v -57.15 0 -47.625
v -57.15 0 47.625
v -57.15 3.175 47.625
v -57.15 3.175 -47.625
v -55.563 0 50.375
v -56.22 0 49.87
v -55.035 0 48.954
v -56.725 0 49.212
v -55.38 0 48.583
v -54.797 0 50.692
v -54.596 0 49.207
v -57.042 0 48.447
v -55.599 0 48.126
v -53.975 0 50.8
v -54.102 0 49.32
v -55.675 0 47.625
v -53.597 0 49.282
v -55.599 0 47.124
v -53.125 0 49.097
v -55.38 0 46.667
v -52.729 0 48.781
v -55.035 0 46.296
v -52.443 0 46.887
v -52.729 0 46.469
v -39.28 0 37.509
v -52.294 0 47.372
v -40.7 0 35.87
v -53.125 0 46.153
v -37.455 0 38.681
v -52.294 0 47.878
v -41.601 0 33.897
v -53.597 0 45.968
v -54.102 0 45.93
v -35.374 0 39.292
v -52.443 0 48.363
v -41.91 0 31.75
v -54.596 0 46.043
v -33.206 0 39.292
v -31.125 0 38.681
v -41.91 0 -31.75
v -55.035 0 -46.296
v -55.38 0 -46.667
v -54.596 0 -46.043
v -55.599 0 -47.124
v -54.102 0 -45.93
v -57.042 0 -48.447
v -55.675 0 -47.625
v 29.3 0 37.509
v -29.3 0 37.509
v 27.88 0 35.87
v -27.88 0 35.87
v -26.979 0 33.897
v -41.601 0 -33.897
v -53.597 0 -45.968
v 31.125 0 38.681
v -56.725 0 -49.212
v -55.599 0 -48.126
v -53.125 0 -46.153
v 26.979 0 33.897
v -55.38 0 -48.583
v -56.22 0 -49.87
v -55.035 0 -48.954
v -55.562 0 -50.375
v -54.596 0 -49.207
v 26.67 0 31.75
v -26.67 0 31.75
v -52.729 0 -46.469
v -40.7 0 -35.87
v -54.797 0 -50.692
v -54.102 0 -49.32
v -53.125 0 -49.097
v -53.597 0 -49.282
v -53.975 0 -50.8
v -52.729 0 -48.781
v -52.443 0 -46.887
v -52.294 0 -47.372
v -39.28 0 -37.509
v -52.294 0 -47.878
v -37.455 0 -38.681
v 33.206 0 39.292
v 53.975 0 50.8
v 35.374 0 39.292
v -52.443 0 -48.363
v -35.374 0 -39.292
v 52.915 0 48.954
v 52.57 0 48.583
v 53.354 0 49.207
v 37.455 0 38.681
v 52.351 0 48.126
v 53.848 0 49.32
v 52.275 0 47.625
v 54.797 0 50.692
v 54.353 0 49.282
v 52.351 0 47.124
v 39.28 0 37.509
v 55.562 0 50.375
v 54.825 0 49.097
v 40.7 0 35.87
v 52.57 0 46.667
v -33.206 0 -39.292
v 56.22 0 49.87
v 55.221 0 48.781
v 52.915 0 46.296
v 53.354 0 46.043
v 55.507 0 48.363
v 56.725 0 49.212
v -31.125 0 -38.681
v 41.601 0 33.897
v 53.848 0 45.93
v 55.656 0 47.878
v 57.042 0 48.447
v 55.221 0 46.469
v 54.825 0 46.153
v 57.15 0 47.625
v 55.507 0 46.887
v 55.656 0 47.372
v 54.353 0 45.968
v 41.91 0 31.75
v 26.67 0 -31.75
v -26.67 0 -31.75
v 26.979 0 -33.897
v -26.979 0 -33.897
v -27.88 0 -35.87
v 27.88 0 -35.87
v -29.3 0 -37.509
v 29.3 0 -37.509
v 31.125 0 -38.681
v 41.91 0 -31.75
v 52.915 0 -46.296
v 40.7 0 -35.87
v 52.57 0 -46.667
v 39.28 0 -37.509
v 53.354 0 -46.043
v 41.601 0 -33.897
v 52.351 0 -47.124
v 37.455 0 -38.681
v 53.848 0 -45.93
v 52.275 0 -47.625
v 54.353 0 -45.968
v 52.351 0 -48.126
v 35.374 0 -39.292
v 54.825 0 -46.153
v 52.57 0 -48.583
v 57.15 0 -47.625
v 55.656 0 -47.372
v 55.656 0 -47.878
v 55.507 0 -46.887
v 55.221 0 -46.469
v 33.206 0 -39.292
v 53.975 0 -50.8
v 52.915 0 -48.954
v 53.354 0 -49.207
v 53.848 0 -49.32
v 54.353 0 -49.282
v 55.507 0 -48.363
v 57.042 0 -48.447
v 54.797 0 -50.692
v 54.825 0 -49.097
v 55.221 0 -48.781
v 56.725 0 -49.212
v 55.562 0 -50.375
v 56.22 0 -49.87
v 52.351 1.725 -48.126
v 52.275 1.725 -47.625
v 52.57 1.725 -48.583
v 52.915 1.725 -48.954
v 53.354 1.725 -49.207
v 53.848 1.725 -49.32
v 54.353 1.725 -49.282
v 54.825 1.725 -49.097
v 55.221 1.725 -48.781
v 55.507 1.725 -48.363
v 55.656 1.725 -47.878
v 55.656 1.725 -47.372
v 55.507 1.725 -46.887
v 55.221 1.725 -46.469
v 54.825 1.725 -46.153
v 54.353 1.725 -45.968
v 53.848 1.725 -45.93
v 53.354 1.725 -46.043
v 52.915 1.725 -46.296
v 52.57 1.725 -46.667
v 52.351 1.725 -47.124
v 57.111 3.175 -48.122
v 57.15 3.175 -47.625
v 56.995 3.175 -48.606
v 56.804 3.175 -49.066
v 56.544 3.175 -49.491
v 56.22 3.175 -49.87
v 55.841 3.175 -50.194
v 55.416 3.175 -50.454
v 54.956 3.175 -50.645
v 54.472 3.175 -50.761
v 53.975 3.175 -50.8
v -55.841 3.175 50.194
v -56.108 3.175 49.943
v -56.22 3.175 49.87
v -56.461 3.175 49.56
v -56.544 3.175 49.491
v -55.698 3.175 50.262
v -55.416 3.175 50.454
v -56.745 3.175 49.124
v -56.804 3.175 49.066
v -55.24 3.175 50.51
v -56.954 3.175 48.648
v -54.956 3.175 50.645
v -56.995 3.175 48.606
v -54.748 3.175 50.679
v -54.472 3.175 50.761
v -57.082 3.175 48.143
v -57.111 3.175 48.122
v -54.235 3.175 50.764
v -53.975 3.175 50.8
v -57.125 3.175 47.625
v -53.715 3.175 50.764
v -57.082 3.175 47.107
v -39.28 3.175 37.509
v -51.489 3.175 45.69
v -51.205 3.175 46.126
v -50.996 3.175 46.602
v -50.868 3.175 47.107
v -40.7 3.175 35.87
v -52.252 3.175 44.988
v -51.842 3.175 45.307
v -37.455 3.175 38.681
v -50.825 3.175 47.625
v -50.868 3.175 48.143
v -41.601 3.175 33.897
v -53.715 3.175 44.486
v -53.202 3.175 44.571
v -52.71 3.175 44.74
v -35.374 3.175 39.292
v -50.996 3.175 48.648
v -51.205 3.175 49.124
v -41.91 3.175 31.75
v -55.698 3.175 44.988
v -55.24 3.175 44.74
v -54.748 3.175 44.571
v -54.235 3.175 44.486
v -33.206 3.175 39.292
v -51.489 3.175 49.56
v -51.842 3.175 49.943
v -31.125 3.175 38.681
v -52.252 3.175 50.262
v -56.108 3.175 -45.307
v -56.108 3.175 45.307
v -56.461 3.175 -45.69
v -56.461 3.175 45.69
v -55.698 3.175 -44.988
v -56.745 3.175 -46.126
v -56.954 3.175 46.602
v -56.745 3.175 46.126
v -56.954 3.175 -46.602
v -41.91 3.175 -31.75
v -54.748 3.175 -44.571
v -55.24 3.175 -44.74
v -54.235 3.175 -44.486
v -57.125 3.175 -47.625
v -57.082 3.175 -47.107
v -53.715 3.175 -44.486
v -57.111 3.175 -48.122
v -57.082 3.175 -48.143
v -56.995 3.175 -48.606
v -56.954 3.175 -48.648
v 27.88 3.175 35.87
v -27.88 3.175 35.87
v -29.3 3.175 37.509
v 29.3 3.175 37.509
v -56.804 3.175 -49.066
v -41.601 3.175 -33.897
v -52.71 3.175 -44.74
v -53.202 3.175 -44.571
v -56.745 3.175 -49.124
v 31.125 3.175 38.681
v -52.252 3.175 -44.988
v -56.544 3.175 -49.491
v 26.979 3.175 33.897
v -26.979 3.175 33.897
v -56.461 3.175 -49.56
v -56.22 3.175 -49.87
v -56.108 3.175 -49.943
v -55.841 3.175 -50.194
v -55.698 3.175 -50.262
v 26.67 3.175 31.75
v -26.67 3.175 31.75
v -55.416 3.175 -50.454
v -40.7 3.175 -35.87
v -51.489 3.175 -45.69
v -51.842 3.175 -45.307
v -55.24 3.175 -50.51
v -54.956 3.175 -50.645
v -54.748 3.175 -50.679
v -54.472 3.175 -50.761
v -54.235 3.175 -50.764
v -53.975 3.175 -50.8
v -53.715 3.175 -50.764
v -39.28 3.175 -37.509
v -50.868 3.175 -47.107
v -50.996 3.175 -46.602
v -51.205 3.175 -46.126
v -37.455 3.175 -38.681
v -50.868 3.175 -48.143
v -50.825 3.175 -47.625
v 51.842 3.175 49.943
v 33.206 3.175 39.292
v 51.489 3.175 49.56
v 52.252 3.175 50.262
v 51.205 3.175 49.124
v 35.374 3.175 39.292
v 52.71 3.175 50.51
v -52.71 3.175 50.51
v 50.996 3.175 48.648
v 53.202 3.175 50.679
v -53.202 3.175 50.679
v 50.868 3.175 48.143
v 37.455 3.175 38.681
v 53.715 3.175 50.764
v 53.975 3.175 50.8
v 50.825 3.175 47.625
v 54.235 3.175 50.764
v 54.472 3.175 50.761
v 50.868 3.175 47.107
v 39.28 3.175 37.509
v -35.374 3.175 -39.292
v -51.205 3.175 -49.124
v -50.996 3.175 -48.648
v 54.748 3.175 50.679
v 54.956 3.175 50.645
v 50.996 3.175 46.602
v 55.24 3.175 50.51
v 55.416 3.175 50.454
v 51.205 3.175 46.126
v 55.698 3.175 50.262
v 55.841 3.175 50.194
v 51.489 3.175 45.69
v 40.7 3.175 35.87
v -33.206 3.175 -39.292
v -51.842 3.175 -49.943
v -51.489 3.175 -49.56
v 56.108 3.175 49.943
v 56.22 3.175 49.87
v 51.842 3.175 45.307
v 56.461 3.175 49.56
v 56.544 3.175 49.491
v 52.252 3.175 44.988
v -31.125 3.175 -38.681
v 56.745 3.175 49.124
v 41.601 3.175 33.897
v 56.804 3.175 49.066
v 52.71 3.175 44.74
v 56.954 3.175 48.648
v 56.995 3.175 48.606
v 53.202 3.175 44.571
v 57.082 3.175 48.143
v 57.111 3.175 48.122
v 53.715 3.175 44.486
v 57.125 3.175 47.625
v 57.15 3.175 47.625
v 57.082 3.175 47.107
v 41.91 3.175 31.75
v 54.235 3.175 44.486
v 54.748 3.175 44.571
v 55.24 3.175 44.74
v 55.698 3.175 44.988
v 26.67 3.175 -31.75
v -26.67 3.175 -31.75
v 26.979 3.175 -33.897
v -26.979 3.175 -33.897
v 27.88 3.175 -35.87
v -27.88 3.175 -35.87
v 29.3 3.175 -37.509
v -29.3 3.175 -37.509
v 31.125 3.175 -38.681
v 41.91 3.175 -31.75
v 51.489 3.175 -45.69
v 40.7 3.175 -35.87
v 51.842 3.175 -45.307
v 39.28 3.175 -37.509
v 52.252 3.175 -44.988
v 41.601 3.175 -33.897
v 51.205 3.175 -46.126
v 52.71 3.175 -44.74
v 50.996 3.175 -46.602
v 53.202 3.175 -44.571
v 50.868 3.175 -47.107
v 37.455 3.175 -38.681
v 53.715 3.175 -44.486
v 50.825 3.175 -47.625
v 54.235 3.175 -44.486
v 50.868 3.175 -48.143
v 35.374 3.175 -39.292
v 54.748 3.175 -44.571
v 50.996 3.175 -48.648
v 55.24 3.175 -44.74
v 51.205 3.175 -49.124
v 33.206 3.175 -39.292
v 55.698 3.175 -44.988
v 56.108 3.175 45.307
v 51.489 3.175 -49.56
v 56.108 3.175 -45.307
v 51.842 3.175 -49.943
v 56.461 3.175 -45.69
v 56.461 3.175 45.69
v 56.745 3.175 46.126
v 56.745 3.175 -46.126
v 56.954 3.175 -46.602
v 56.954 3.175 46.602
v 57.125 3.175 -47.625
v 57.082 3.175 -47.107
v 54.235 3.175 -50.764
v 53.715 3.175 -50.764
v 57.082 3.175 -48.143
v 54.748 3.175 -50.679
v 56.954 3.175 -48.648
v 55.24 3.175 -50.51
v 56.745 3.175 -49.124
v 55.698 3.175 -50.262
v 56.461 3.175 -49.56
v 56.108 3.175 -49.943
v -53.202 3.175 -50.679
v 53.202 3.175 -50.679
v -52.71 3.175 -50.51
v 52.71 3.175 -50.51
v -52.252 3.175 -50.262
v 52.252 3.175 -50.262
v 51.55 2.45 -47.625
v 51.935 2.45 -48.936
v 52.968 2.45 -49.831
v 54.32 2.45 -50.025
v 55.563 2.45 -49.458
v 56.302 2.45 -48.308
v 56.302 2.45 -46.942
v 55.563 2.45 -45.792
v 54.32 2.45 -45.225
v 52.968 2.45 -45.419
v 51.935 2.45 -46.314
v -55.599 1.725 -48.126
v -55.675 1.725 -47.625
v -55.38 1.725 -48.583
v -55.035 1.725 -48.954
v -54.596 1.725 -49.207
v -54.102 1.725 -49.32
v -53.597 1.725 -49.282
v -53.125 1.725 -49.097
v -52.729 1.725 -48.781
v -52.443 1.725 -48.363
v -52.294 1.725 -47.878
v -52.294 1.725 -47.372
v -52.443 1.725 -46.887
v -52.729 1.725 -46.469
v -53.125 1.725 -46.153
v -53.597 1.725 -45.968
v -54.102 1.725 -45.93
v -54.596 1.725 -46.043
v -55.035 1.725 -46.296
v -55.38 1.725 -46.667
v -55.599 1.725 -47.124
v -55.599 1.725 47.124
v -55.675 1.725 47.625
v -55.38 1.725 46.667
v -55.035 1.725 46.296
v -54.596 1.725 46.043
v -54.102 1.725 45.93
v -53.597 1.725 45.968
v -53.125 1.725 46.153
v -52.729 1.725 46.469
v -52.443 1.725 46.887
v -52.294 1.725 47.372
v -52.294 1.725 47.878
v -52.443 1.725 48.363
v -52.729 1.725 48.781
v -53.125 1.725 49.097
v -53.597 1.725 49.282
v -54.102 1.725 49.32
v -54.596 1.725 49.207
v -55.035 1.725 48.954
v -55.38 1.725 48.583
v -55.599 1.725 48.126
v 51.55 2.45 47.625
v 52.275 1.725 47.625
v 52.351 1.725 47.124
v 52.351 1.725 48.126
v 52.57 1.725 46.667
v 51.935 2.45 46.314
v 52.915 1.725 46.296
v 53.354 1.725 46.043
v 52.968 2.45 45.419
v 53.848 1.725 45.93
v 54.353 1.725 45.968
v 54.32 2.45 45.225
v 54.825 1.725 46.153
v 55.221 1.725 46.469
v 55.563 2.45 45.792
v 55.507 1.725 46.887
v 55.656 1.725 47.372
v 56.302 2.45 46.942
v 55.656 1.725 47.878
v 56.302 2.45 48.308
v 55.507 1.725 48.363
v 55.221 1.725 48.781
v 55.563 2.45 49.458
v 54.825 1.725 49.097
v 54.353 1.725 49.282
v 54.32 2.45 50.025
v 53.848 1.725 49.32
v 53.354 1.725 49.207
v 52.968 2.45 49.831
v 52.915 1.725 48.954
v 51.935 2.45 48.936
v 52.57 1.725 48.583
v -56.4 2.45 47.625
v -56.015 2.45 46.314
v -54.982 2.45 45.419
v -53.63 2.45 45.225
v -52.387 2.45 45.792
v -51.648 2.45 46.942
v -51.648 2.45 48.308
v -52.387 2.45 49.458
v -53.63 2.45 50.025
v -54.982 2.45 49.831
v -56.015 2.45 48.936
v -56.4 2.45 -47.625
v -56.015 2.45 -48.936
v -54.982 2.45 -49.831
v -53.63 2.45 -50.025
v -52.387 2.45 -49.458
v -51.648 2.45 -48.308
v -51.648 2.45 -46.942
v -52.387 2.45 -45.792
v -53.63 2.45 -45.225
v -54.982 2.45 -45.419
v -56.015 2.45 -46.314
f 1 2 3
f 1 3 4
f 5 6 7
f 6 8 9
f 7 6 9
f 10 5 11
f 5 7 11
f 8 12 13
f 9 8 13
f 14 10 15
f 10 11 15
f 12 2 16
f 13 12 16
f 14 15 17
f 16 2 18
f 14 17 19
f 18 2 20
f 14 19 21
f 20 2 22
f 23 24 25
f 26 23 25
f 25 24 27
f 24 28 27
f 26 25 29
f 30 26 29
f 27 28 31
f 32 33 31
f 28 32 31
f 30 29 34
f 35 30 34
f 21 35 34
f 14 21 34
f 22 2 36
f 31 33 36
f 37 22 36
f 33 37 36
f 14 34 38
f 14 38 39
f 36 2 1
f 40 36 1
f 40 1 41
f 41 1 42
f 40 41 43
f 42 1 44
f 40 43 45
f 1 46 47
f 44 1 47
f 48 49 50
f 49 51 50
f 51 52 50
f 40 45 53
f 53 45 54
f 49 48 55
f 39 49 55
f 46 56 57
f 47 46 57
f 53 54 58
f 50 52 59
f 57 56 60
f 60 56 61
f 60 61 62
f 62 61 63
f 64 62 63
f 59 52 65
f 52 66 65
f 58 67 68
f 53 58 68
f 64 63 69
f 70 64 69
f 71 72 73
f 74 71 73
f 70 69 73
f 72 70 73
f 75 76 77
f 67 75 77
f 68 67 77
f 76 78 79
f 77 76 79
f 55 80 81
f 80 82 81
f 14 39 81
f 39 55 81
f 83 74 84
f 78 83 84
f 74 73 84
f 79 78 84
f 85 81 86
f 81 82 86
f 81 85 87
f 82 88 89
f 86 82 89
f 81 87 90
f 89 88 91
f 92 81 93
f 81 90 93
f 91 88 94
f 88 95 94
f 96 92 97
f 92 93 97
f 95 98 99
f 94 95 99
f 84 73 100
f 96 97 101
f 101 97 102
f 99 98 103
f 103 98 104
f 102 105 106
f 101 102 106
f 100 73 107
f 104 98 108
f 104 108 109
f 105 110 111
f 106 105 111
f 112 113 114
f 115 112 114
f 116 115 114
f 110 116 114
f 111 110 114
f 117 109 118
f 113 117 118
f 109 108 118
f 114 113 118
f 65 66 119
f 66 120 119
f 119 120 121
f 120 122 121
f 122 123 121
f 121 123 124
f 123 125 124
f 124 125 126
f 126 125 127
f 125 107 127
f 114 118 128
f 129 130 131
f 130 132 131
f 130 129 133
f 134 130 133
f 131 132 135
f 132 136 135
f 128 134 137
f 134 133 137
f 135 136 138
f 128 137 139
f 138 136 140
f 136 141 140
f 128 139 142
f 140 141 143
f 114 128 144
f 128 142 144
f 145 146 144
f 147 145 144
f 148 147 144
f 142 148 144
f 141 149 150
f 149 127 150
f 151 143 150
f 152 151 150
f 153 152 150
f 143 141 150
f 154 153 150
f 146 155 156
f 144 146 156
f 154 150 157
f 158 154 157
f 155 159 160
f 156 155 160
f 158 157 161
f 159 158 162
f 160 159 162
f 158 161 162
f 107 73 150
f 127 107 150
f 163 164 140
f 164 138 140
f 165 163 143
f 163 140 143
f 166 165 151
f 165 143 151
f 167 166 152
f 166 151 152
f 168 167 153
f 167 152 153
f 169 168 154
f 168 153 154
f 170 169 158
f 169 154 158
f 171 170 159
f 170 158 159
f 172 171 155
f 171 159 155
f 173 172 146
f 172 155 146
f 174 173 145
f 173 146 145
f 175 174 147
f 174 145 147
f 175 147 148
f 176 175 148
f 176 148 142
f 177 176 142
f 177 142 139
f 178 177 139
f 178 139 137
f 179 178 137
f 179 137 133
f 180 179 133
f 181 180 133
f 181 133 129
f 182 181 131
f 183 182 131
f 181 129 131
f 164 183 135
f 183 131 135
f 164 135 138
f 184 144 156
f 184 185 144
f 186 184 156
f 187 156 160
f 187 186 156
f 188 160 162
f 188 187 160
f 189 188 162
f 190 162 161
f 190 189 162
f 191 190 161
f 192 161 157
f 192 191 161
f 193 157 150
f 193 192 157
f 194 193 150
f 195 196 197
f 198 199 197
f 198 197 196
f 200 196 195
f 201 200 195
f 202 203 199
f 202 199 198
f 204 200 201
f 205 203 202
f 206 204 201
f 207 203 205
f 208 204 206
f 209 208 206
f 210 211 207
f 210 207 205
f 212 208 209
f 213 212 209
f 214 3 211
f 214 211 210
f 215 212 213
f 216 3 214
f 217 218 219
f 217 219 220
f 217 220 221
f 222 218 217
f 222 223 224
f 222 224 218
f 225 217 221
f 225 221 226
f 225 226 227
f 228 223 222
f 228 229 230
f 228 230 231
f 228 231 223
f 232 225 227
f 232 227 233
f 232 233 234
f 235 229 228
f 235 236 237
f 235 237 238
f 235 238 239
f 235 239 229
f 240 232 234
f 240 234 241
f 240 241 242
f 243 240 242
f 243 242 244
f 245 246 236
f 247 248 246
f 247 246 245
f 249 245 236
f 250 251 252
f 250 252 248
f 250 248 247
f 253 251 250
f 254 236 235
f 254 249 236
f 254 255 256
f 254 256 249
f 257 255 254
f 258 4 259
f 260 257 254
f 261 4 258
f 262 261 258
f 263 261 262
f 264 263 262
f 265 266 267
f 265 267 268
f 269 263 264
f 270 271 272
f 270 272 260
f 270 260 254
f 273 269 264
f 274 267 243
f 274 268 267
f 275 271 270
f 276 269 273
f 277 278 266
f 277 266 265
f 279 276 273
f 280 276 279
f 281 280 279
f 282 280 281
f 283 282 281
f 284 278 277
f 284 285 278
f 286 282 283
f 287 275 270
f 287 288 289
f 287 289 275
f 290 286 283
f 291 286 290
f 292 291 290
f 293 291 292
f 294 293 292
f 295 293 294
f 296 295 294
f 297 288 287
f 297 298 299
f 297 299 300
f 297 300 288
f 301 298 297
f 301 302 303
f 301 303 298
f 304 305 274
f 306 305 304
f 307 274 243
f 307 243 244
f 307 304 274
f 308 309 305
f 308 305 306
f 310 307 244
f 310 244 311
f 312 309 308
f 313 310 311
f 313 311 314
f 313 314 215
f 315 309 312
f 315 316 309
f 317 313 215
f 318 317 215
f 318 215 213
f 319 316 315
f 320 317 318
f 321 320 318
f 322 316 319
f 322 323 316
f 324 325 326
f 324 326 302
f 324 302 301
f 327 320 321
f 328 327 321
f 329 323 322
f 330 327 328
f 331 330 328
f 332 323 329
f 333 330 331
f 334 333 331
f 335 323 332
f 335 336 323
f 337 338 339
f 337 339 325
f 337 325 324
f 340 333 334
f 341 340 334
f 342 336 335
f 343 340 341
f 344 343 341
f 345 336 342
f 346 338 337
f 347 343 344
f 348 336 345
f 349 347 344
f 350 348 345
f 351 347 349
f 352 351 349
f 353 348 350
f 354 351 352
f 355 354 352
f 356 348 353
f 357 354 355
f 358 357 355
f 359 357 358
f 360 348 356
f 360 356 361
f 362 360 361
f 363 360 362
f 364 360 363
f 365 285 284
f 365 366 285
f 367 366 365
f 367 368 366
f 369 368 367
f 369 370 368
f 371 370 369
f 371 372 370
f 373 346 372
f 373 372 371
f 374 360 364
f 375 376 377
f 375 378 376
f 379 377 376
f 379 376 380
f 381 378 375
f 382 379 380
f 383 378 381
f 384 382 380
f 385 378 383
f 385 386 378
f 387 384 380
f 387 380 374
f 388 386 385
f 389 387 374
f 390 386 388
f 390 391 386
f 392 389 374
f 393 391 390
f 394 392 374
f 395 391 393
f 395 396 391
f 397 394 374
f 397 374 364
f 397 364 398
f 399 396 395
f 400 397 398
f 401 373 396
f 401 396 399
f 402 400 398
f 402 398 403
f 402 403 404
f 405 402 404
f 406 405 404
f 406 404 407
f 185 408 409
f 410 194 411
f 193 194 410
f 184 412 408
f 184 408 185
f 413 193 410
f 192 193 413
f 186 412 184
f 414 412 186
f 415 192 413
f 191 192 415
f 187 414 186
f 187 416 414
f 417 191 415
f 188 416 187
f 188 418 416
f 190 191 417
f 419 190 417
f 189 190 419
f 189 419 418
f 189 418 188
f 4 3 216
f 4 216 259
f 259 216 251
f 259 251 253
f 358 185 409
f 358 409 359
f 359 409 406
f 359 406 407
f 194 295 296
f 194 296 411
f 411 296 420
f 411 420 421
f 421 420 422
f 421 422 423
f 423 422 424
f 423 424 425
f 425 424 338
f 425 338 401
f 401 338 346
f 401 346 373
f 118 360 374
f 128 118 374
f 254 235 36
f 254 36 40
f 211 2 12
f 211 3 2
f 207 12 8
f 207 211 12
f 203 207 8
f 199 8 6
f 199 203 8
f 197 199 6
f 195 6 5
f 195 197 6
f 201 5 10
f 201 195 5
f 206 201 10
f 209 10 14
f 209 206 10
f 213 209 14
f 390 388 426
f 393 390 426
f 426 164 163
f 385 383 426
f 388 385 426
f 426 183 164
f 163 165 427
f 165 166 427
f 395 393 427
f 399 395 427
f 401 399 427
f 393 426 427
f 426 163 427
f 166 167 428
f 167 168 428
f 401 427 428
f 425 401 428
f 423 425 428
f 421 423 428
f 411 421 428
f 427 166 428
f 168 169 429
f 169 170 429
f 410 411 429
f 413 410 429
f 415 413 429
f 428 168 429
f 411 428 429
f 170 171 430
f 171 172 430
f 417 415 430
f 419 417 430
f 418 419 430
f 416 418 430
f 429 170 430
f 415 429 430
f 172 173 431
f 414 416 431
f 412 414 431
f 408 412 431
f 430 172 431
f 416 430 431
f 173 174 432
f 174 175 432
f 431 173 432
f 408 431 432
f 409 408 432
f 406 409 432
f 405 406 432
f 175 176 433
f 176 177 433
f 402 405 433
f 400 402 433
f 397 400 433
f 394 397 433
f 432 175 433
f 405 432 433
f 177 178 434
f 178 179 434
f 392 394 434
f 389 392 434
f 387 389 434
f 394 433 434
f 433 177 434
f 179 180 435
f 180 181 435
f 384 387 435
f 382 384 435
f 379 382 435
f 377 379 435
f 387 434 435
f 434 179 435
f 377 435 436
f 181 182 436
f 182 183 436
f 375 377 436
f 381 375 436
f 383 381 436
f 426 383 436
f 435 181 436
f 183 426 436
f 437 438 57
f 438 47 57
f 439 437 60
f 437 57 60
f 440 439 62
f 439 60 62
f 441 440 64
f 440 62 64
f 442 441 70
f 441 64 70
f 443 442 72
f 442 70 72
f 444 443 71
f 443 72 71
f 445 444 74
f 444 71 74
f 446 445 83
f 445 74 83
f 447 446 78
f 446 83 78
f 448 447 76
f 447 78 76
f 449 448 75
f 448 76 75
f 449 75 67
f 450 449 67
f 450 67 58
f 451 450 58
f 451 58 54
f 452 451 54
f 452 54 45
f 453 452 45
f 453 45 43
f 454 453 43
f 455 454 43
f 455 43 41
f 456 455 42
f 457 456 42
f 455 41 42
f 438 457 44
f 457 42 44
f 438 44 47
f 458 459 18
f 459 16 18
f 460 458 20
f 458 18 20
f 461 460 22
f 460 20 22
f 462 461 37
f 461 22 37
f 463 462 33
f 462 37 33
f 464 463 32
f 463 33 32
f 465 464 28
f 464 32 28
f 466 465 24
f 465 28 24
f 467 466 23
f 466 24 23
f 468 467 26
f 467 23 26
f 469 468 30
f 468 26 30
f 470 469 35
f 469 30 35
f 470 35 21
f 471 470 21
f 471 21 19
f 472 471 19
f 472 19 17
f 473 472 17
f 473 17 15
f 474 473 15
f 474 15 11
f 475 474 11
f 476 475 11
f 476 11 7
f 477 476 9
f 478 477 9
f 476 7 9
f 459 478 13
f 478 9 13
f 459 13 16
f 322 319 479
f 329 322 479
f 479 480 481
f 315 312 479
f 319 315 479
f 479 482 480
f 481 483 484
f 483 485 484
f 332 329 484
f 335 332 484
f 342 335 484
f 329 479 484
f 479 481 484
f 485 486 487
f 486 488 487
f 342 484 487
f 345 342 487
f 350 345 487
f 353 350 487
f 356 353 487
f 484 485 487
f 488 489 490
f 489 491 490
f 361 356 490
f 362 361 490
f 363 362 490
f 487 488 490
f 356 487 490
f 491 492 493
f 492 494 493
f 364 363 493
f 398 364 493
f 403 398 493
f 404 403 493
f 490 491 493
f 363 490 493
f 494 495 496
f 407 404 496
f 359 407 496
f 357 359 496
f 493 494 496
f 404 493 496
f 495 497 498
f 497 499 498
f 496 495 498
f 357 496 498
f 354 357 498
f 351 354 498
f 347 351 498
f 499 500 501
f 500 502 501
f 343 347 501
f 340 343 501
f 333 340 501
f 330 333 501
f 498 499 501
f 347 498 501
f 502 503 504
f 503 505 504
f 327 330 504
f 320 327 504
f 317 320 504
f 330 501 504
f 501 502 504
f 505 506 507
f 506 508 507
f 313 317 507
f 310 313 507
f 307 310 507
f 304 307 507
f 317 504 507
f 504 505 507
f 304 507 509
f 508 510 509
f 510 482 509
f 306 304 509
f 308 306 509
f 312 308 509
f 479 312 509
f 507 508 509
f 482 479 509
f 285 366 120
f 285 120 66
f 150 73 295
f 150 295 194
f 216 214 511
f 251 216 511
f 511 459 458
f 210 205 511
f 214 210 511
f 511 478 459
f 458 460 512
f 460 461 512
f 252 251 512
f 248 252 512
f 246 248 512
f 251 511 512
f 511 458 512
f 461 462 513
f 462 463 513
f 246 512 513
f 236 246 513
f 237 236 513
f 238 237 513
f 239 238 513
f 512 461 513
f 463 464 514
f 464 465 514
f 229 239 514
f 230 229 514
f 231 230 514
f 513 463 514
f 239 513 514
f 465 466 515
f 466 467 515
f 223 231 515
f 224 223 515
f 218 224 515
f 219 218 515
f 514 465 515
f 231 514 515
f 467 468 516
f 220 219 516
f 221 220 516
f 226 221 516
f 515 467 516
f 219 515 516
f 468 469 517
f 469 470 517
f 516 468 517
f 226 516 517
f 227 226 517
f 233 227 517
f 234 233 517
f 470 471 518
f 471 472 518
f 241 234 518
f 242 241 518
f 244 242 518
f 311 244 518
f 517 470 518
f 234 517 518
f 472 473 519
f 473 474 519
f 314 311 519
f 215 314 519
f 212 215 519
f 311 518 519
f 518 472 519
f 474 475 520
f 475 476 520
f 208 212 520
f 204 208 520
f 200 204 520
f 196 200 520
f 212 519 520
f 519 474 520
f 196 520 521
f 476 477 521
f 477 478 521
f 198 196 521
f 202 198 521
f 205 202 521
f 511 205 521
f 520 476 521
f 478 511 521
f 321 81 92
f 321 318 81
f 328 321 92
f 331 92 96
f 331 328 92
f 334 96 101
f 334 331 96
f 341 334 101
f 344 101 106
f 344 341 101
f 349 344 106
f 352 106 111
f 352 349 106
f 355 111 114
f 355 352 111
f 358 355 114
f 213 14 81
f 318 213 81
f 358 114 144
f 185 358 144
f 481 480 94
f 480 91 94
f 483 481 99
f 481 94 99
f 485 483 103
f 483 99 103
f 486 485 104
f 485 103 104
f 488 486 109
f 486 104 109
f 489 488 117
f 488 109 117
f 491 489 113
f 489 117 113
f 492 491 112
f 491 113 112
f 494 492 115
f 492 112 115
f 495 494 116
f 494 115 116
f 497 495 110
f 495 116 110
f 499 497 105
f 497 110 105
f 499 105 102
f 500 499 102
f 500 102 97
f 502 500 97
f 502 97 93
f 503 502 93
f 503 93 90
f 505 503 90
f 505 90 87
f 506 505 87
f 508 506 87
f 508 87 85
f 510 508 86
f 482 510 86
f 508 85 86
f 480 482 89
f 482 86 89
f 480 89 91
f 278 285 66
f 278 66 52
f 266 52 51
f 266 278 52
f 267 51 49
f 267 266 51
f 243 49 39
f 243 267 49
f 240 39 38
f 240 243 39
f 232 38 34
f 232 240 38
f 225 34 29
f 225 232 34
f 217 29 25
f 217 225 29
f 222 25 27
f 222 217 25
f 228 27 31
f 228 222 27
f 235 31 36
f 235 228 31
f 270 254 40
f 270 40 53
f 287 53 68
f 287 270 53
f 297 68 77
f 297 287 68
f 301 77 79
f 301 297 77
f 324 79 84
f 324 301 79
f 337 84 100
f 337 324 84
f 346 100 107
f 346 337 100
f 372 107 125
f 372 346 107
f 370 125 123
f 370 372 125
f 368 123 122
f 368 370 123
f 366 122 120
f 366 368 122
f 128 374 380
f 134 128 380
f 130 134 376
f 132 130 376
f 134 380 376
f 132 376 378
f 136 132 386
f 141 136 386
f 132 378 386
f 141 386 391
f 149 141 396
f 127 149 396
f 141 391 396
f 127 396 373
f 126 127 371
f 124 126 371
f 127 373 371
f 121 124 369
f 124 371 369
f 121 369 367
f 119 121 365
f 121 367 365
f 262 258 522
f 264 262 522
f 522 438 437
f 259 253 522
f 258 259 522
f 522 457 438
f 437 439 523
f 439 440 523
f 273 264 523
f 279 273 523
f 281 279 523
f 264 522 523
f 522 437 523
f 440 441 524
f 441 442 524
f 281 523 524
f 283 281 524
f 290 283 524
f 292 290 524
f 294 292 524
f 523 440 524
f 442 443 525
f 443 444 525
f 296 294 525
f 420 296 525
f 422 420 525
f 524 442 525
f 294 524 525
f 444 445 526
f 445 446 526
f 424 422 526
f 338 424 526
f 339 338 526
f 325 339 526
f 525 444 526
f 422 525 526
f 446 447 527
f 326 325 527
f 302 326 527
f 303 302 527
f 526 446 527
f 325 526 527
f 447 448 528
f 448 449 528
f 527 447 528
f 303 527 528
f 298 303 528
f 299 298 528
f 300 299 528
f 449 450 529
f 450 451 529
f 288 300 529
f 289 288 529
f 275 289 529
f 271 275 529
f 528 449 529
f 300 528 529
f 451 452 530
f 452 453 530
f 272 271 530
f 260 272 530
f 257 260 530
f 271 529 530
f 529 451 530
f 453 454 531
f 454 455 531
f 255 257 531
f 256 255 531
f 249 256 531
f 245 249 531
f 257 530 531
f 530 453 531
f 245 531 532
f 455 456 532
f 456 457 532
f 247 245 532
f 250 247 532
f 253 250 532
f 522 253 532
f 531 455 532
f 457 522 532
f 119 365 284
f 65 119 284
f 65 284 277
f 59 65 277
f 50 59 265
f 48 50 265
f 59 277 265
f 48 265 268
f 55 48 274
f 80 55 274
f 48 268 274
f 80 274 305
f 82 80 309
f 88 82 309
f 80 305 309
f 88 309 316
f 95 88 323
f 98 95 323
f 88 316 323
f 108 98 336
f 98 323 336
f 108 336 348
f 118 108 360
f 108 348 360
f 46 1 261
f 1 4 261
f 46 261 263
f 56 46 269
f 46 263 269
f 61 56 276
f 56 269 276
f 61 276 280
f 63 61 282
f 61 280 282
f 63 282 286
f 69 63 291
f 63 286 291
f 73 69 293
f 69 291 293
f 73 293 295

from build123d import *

# Parameters (mm, degrees)
SKETCH1_W                                       = 114.3
SKETCH1_H                                       = 101.6
BOSS_EXTRUDE1_DEPTH                             = 3.175
FILLET1_R                                       = 3.175
CSK_FOR_M3_FLAT_HEAD_MACHINE_SCREW1_D           = 3.4
CSK_FOR_M3_FLAT_HEAD_MACHINE_SCREW1_DEPTH       = 7.874
CSK_FOR_M3_FLAT_HEAD_MACHINE_SCREW1_CSINK_D     = 6.3
CSK_FOR_M3_FLAT_HEAD_MACHINE_SCREW1_CSINK_ANGLE = 90
CSK_FOR_M3_FLAT_HEAD_MACHINE_SCREW1_TIP         = 1.021463052
CUT_EXTRUDE1_DEPTH                              = 77.530014537


with BuildPart() as part:
    # Sketch1 → Boss-Extrude1 (new body)
    with BuildSketch(Plane(origin=(0, 0, 0), x_dir=(1, 0, 0), z_dir=(0, 1, 0))):
        Rectangle(SKETCH1_W, SKETCH1_H)
    extrude(amount=BOSS_EXTRUDE1_DEPTH)

    # Fillet1
    fillet1_edges = [part.edges().sort_by_distance(p)[0] for p in [
        (-57.15, 1.5875, -50.8),
        (57.15, 1.5875, -50.8),
        (57.15, 1.5875, 50.8),
        (-57.15, 1.5875, 50.8),
    ]]
    fillet(fillet1_edges, radius=FILLET1_R)

    # CSK for M3 Flat Head Machine Screw1
    with Locations(Plane(origin=(0, 3.175, 0), x_dir=(1, 0, 0), z_dir=(0, 1, 0))):
        with Locations((53.975, -47.625), (53.975, 47.625), (-53.975, 47.625), (-53.975, -47.625)):
            CounterSinkHole(CSK_FOR_M3_FLAT_HEAD_MACHINE_SCREW1_D / 2, CSK_FOR_M3_FLAT_HEAD_MACHINE_SCREW1_CSINK_D / 2, depth=CSK_FOR_M3_FLAT_HEAD_MACHINE_SCREW1_DEPTH, counter_sink_angle=CSK_FOR_M3_FLAT_HEAD_MACHINE_SCREW1_CSINK_ANGLE)
            with Locations((0, 0, -(CSK_FOR_M3_FLAT_HEAD_MACHINE_SCREW1_DEPTH + CSK_FOR_M3_FLAT_HEAD_MACHINE_SCREW1_TIP / 2))):  # 118° drill point
                Cone(0, CSK_FOR_M3_FLAT_HEAD_MACHINE_SCREW1_D / 2, CSK_FOR_M3_FLAT_HEAD_MACHINE_SCREW1_TIP, mode=Mode.SUBTRACT)

    # Sketch4 → Cut-Extrude1 (cut, through all)
    with BuildSketch(Plane(origin=(0, 3.175, 0), x_dir=(1, 0, 0), z_dir=(0, 1, 0))):
        with BuildLine():
            Line((-41.91, -31.75), (-41.91, 31.75))
            ThreePointArc((-41.91, 31.75), (-34.29, 39.37), (-26.67, 31.75))
            Line((-26.67, 31.75), (-26.67, -31.75))
            ThreePointArc((-26.67, -31.75), (-34.29, -39.37), (-41.91, -31.75))
        make_face()
        with BuildLine():
            Line((41.91, -31.75), (41.91, 31.75))
            ThreePointArc((41.91, 31.75), (34.29, 39.37), (26.67, 31.75))
            Line((26.67, 31.75), (26.67, -31.75))
            ThreePointArc((26.67, -31.75), (34.29, -39.37), (41.91, -31.75))
        make_face()
    extrude(amount=-CUT_EXTRUDE1_DEPTH, mode=Mode.SUBTRACT)


solid = part.part
